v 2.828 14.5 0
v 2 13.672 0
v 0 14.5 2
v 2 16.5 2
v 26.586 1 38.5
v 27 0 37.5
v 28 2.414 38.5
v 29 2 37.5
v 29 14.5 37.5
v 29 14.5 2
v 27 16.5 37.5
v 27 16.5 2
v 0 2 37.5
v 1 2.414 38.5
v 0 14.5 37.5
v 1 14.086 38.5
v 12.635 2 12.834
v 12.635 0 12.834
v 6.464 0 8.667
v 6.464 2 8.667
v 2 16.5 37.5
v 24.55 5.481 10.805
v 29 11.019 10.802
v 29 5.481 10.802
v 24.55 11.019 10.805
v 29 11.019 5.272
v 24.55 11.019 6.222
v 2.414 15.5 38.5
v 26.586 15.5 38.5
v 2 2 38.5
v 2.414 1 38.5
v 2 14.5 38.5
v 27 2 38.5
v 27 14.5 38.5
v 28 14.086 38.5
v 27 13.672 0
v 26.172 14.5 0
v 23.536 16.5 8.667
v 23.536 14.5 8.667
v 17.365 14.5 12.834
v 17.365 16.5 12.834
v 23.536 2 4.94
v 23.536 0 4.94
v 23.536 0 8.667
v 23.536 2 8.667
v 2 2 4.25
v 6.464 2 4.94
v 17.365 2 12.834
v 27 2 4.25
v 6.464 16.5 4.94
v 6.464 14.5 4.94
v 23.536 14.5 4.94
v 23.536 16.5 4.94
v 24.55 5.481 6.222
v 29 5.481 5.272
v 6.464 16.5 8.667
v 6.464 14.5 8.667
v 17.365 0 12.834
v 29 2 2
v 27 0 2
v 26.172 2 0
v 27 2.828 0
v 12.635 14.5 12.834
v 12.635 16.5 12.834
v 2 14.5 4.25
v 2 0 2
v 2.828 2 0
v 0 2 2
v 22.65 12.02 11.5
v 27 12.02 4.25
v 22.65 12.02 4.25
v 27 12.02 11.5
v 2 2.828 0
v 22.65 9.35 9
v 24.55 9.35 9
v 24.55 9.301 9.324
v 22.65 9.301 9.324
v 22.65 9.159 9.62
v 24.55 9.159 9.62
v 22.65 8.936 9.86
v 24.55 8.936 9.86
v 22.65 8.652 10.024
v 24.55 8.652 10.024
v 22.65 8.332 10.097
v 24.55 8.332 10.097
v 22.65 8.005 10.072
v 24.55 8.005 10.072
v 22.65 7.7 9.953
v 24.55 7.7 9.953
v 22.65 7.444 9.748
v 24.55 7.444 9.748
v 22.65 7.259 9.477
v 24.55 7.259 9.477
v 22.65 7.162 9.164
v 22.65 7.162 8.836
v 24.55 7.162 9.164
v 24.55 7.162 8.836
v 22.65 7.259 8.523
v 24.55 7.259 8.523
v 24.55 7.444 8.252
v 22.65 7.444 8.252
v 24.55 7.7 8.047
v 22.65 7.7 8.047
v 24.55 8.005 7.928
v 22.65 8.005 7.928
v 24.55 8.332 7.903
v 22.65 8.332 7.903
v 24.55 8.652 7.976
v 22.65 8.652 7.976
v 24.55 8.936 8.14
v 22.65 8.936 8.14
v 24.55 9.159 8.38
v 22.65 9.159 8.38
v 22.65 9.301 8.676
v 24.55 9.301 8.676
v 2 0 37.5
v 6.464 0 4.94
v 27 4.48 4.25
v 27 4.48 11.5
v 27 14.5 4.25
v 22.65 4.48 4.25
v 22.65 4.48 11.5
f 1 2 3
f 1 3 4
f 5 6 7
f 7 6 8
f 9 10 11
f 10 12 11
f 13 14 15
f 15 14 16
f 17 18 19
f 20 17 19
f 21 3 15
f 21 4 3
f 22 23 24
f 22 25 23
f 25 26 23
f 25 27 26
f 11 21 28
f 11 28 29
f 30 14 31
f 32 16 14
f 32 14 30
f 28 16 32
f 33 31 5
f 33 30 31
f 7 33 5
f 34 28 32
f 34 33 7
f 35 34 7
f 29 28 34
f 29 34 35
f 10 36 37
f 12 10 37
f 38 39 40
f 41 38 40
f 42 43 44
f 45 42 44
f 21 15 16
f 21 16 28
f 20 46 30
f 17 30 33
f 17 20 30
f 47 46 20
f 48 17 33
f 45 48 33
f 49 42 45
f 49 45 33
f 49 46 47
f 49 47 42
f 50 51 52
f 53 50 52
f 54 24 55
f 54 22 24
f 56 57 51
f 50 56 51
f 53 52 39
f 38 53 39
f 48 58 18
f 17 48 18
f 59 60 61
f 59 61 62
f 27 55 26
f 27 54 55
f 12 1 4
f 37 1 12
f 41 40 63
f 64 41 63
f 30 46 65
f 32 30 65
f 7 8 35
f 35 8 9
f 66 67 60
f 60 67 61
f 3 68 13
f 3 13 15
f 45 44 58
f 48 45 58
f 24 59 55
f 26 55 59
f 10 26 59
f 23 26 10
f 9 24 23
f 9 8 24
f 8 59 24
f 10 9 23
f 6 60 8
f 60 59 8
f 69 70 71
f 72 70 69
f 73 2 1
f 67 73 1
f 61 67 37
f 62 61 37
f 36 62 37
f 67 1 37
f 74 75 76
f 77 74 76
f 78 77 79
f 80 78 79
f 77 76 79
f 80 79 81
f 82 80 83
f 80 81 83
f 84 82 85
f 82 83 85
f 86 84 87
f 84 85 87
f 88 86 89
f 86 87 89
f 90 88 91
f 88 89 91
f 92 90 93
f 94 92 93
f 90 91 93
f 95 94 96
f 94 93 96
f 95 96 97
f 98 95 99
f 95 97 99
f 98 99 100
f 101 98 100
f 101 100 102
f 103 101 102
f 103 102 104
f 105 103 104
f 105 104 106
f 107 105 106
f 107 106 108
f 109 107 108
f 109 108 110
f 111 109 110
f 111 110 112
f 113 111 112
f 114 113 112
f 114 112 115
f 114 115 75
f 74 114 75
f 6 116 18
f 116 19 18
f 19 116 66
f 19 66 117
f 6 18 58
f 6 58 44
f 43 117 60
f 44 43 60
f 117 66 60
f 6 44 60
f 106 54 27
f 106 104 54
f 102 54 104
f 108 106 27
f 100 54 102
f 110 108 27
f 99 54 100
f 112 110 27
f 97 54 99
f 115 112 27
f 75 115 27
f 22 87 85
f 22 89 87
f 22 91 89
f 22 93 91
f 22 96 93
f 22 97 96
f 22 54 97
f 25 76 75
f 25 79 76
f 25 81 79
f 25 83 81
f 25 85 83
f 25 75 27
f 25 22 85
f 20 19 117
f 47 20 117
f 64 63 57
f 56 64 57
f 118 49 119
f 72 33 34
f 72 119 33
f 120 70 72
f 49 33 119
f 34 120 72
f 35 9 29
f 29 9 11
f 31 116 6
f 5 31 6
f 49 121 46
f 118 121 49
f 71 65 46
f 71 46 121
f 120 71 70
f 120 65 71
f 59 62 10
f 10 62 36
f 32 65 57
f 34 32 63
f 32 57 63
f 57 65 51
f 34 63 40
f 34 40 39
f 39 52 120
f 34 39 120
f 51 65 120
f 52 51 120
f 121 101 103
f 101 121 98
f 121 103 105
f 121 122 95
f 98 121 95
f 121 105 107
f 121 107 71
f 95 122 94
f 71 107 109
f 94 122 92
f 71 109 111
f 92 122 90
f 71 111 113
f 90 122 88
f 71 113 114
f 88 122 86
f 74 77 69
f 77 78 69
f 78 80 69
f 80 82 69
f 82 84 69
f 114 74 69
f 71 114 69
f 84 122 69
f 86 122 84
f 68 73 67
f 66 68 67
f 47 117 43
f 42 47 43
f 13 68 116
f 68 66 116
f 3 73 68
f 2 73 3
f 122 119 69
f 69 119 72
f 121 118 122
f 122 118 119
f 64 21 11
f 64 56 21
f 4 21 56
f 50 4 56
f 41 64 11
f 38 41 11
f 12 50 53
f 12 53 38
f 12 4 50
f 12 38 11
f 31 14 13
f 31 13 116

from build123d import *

# Parameters (mm, degrees)
F0_W      = 29
F0_H      = 16.5
F1_DEPTH  = 38.5
F2_T      = -2
F3_DEPTH  = 2.25
F4_SIZE   = 2
F5_SIZE   = 2
F6_SIZE   = 1
F8_DEPTH  = 16.501
F9_W      = 7.54
F9_H      = 7.25
F9_R      = 1.1
F10_DEPTH = 6.35
F11_W     = 5.538
F11_H     = 5.53
F13_W     = 5.538
F13_H     = 4.583


with BuildPart() as f1:
    # F0 (on Top) → F1 (new body)
    with BuildSketch(Plane.XY):
        with Locations((14.5, 8.25)):
            Rectangle(F0_W, F0_H)
    extrude(amount=F1_DEPTH)

    # F2
    f2_openings = [f1.faces().sort_by_distance(p)[0] for p in [
        (14.5, 8.25, 38.5),
    ]]
    offset(amount=F2_T, openings=f2_openings)

    # F3 (add): a face of the model
    f3_faces = [f1.faces().sort_by_distance(p)[0] for p in [
        (14.5, 8.25, 2),
    ]]
    extrude(f3_faces, amount=F3_DEPTH)

    # F4
    f4_edges = [f1.edges().sort_by_distance(p)[0] for p in [
        (29, 16.5, 19.25),
        (29, 0, 19.25),
        (0, 16.5, 19.25),
        (0, 0, 19.25),
    ]]
    chamfer(f4_edges, length=F4_SIZE)

    # F5
    f5_edges = [f1.edges().sort_by_distance(p)[0] for p in [
        (0, 8.25, 0),
        (1, 15.5, 0),
        (1, 1, 0),
        (14.5, 16.5, 0),
        (14.5, 0, 0),
        (28, 15.5, 0),
        (28, 1, 0),
        (29, 8.25, 0),
    ]]
    chamfer(f5_edges, length=F5_SIZE)

    # F6
    f6_edges = [f1.edges().sort_by_distance(p)[0] for p in [
        (14.5, 0, 38.5),
        (1, 1, 38.5),
        (0, 8.25, 38.5),
        (1, 15.5, 38.5),
        (14.5, 16.5, 38.5),
        (28, 15.5, 38.5),
        (29, 8.25, 38.5),
        (28, 1, 38.5),
    ]]
    chamfer(f6_edges, length=F6_SIZE)

    # F7 (on face) → F8 (cut, through all)
    with BuildSketch(Plane.XZ):
        Polygon((17.365, 12.834), (12.635, 12.834), (6.464, 8.667), (6.464, 4.94), (23.536, 4.94), (23.536, 8.667), align=None)
    extrude(amount=-F8_DEPTH, mode=Mode.SUBTRACT)

    # F9 (on face) → F10 (join)
    with BuildSketch(Plane.YZ.offset(29)):
        with Locations((8.25, 7.875)):
            Rectangle(F9_W, F9_H)
        with Locations((8.25, 9)):
            Circle(F9_R, mode=Mode.SUBTRACT)
    extrude(amount=-F10_DEPTH)

    # F11 (on face) → F14 section 0
    with BuildSketch(Plane.YZ.offset(29)):
        with Locations((8.25, 8.037)):
            Rectangle(F11_W, F11_H)
    # F13 (on offset) → F14 section 1
    with BuildSketch(Plane.YZ.offset(24.55)):
        with Locations((8.25, 8.5135)):
            Rectangle(F13_W, F13_H)
    loft(mode=Mode.SUBTRACT)


solid = f1.part
